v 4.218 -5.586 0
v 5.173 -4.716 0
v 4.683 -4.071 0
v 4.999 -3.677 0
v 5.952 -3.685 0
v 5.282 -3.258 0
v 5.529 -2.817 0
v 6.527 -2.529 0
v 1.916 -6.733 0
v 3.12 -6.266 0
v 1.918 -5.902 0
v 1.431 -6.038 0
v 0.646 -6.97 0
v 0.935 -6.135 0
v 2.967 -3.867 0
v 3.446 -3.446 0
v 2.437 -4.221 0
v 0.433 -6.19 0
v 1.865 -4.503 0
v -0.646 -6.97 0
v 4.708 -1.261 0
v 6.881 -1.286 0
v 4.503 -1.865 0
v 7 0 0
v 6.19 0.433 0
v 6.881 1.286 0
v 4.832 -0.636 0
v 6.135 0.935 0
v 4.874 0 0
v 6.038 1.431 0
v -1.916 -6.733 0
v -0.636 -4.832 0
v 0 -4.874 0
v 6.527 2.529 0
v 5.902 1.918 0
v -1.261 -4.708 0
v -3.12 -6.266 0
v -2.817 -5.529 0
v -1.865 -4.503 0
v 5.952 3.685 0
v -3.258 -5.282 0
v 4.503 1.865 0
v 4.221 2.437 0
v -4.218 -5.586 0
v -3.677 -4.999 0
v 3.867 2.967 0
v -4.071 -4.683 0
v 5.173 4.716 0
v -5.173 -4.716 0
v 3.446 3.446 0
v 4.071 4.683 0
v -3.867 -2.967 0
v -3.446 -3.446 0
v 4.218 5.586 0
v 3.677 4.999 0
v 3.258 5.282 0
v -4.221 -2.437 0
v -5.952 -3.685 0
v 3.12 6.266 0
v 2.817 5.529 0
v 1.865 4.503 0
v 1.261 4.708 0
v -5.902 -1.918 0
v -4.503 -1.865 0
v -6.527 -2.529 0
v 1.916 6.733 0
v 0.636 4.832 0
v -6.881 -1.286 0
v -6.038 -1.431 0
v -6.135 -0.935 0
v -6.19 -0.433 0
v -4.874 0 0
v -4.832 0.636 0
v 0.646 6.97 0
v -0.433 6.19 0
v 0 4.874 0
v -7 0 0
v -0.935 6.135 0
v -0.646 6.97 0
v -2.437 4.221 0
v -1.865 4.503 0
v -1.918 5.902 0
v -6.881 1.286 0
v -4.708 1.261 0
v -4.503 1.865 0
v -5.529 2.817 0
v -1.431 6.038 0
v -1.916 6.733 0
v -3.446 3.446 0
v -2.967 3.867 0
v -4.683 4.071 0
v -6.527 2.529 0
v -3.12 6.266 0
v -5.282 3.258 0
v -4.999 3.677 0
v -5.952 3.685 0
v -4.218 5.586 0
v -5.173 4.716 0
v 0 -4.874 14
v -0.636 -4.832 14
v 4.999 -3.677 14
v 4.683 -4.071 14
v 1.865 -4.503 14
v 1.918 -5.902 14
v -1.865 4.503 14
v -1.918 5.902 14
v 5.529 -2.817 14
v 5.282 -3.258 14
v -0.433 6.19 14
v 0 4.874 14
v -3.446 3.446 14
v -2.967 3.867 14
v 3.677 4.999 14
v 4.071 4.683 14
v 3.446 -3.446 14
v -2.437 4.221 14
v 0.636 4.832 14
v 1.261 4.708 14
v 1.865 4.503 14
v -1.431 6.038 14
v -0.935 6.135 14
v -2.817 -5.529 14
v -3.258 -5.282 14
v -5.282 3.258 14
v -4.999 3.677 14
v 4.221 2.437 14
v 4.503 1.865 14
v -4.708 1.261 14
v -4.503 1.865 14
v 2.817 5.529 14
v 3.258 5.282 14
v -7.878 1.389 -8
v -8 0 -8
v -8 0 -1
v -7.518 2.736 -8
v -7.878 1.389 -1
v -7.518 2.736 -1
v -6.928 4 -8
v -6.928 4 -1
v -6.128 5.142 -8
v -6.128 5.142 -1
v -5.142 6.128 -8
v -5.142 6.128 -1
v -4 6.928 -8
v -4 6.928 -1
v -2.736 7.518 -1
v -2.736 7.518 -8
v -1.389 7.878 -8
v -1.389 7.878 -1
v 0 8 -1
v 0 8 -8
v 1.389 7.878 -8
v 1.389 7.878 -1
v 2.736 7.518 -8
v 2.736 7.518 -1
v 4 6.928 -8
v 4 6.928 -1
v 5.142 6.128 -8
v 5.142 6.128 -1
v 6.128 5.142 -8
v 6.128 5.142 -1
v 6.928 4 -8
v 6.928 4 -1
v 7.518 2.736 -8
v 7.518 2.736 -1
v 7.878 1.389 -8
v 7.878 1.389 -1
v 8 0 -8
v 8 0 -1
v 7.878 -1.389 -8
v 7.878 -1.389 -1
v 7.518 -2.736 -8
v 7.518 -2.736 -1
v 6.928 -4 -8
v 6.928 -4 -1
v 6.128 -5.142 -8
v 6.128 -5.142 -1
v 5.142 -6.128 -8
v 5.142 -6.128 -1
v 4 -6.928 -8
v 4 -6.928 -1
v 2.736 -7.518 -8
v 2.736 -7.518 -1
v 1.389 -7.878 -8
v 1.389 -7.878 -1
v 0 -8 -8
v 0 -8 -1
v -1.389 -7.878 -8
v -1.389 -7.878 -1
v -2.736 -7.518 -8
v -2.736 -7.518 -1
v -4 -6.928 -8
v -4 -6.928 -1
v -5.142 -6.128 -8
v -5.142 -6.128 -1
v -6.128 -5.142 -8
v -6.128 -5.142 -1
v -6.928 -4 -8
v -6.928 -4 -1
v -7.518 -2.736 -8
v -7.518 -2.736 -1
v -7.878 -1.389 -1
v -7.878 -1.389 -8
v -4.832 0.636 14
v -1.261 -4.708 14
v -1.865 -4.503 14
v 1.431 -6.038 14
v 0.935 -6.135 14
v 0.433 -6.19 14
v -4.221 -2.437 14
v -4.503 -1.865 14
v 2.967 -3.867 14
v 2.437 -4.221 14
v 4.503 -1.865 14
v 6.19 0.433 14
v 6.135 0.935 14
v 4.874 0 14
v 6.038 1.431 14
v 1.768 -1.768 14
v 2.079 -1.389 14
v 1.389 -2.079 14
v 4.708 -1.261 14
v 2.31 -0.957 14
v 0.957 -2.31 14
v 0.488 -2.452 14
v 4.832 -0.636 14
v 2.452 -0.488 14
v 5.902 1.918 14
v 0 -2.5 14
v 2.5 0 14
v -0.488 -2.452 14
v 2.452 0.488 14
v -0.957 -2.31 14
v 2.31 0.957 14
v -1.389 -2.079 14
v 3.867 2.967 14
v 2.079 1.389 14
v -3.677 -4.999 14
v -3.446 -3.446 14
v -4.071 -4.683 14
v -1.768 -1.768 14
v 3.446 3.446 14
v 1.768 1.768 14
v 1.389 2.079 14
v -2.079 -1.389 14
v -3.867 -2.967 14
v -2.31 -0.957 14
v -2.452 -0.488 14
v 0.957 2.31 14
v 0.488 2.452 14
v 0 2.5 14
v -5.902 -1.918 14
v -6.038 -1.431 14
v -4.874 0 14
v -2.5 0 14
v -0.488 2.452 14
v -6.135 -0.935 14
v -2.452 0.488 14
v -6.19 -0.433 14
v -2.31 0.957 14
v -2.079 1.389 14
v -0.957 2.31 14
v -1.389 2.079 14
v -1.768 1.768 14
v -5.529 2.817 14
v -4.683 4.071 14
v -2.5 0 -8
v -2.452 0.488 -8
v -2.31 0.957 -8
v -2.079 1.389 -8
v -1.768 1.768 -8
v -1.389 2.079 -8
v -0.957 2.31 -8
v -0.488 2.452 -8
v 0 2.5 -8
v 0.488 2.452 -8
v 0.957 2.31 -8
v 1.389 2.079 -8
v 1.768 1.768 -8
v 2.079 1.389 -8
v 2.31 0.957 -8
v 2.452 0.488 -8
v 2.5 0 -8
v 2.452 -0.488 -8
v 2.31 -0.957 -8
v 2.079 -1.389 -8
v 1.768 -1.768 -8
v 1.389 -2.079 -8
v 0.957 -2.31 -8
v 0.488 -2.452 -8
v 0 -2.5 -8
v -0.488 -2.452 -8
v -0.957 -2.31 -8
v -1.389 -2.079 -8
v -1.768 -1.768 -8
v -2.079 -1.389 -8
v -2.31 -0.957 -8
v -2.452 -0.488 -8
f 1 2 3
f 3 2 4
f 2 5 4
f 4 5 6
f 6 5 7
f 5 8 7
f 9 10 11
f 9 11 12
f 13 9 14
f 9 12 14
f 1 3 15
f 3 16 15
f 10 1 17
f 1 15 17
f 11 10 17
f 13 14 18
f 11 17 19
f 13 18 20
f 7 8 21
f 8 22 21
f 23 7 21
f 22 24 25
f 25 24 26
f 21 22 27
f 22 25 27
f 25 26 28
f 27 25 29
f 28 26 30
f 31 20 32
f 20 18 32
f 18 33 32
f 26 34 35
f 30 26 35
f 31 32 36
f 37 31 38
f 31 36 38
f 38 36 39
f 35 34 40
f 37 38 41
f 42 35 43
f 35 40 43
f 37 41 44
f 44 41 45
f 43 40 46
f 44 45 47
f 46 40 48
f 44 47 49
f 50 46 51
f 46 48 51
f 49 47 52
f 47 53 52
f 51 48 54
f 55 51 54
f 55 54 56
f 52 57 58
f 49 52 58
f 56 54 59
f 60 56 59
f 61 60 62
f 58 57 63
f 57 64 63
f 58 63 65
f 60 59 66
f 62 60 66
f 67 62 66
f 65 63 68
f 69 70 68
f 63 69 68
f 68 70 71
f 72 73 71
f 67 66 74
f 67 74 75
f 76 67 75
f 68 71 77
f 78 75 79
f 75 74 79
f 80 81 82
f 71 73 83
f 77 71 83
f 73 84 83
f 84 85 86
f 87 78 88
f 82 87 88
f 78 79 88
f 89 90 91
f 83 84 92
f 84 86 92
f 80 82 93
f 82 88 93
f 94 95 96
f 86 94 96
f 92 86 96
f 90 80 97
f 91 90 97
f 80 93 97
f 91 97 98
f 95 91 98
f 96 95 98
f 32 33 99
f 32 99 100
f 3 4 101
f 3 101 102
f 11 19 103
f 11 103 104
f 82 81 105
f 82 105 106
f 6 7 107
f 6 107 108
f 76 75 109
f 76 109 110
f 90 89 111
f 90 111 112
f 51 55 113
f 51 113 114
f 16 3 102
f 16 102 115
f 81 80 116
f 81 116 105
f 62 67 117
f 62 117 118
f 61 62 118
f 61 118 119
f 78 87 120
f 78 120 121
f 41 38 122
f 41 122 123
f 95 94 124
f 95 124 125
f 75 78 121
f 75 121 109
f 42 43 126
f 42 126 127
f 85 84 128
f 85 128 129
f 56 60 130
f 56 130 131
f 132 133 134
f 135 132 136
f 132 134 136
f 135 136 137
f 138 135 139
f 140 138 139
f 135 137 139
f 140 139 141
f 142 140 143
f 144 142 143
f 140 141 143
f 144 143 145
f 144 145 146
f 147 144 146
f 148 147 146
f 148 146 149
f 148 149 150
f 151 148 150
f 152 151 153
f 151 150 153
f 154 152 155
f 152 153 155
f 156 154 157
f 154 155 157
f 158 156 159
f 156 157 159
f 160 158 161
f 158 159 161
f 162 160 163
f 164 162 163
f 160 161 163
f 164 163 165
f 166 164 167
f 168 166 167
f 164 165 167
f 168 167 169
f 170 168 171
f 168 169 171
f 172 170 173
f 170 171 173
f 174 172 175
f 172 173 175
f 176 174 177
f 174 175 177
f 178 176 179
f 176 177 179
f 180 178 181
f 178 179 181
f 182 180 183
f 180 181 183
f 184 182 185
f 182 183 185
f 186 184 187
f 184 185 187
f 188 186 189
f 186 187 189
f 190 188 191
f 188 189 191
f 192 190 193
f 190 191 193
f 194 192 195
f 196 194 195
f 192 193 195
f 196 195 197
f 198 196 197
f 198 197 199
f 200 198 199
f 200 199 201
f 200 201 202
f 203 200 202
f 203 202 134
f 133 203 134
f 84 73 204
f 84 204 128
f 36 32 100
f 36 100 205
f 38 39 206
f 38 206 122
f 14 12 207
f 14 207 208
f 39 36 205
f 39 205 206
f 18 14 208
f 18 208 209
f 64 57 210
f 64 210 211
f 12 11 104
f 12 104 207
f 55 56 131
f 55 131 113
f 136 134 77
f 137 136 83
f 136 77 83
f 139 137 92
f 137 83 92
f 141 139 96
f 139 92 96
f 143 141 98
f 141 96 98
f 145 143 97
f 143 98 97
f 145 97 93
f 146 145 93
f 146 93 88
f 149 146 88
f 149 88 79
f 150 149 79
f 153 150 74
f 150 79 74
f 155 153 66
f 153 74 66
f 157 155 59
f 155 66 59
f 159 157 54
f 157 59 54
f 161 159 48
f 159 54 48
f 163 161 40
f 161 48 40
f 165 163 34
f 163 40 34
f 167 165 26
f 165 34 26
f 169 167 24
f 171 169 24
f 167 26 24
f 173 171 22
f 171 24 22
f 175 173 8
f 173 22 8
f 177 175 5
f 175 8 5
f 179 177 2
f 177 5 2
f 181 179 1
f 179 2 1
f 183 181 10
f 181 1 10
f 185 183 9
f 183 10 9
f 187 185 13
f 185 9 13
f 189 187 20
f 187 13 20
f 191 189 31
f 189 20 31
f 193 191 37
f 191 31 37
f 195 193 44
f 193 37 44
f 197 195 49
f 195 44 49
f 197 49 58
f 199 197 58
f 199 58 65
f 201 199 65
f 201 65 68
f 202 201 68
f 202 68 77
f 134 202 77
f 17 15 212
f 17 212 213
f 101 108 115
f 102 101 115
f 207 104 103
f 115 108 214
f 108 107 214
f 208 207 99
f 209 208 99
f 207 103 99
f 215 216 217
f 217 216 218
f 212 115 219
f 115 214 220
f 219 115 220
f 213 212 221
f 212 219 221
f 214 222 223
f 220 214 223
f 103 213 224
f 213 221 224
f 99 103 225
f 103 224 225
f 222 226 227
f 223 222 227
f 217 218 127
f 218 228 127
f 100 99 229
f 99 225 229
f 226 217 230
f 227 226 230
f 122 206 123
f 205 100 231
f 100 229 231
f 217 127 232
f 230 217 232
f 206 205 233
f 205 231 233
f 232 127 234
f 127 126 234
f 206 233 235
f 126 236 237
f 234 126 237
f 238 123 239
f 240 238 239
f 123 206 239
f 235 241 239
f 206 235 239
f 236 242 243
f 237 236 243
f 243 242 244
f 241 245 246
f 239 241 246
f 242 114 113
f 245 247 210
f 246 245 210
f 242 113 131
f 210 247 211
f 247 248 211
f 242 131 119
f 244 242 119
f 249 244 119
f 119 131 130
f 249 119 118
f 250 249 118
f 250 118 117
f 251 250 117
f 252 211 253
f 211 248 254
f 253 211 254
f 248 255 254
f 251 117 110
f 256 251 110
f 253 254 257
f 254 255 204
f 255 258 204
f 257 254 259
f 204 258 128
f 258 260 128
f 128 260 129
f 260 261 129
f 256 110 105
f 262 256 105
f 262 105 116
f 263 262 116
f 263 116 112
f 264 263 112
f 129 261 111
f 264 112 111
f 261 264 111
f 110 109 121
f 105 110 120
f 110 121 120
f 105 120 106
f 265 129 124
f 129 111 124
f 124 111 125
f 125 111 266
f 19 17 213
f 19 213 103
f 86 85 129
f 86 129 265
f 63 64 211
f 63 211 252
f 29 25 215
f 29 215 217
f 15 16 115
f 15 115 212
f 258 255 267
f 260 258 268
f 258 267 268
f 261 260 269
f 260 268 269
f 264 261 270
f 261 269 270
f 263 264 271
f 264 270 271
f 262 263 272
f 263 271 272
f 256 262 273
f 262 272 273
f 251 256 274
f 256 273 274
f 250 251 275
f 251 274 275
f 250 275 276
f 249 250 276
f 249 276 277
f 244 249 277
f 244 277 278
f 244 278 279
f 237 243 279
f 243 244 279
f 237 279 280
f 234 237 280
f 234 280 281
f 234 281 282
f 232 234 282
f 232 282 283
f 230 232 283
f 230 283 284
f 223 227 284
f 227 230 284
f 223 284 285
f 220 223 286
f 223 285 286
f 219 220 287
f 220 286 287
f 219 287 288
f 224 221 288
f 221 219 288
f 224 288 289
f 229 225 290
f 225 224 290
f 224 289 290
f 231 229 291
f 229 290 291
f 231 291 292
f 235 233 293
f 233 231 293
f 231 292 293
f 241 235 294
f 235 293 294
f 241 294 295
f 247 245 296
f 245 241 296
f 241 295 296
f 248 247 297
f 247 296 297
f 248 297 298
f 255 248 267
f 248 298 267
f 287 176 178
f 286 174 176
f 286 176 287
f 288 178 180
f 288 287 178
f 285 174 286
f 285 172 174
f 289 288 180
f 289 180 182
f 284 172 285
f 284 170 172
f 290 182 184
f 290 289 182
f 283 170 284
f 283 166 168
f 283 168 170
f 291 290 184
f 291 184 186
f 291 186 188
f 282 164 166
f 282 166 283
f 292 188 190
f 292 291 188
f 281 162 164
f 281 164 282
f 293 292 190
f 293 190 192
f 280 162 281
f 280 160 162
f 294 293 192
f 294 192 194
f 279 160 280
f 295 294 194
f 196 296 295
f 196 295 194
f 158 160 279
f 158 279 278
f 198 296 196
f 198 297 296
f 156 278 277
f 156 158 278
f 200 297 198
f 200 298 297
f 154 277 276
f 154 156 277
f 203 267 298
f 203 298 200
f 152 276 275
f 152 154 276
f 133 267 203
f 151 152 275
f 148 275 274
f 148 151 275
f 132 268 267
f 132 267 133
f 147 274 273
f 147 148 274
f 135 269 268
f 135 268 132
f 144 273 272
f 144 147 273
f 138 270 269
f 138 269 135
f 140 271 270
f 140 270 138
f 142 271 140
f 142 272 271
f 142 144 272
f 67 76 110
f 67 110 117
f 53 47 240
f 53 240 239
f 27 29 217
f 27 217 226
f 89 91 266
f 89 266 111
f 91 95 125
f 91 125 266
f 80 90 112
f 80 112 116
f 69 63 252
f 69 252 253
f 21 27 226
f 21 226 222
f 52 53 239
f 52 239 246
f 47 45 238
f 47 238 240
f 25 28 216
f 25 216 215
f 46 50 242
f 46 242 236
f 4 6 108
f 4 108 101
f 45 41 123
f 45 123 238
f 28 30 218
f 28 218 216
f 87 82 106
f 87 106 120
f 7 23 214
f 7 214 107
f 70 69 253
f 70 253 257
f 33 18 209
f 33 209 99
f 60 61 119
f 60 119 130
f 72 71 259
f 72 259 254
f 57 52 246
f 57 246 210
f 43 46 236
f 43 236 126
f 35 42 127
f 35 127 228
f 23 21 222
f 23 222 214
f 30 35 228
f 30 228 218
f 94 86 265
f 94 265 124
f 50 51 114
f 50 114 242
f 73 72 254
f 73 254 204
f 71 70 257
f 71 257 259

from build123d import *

# Parameters (mm, degrees)
SKETCH2_R           = 2.5
BOSS_EXTRUDE1_DEPTH = 14
SKETCH3_R           = 8
BOSS_EXTRUDE2_DEPTH = 8
SKETCH4_R           = 2.5
CUT_EXTRUDE1_DEPTH  = 23
CHAMFER1_SIZE       = 1


with BuildPart() as part:
    # Sketch2 → Boss-Extrude1 (new body)
    with BuildSketch(Plane.XY):
        Polygon((4.873707771, 0), (4.832012177, -0.636146486), (4.707640171, -1.261407971), (4.502718925, -1.865087032), (5.52904892, -2.817190886), (5.281517029, -3.257688046), (4.998967171, -3.676585913), (4.683272839, -4.071106911), (3.44623208, -3.44623208), (2.966924906, -3.866571903), (2.436853886, -4.2207551), (1.865087032, -4.502718925), (1.917572975, -5.901682854), (1.431063056, -6.038129807), (0.935064673, -6.134541988), (0.432866603, -6.190280914), (0, -4.873707771), (-0.636146486, -4.832012177), (-1.261407971, -4.707640171), (-1.865087032, -4.502718925), (-2.817190886, -5.52904892), (-3.257688046, -5.281517029), (-3.676585913, -4.998967171), (-4.071106911, -4.683272839), (-3.44623208, -3.44623208), (-3.866571903, -2.966924906), (-4.2207551, -2.436853886), (-4.502718925, -1.865087032), (-5.901682854, -1.917572975), (-6.038129807, -1.431063056), (-6.134541988, -0.935064673), (-6.190280914, -0.432866603), (-4.873707771, 0), (-4.832012177, 0.636146486), (-4.707640171, 1.261407971), (-4.502718925, 1.865087032), (-5.52904892, 2.817190886), (-5.281517029, 3.257688046), (-4.998967171, 3.676585913), (-4.683272839, 4.071106911), (-3.44623208, 3.44623208), (-2.966924906, 3.866571903), (-2.436853886, 4.2207551), (-1.865087032, 4.502718925), (-1.917572975, 5.901682854), (-1.431063056, 6.038129807), (-0.935064673, 6.134541988), (-0.432866603, 6.190280914), (0, 4.873707771), (0.636146486, 4.832012177), (1.261407971, 4.707640171), (1.865087032, 4.502718925), (2.817190886, 5.52904892), (3.257688046, 5.281517029), (3.676585913, 4.998967171), (4.071106911, 4.683272839), (3.44623208, 3.44623208), (3.866571903, 2.966924906), (4.2207551, 2.436853886), (4.502718925, 1.865087032), (5.901682854, 1.917572975), (6.038129807, 1.431063056), (6.134541988, 0.935064673), (6.190280914, 0.432866603), align=None)
        Circle(SKETCH2_R, mode=Mode.SUBTRACT)
    extrude(amount=BOSS_EXTRUDE1_DEPTH)

    # Sketch3 → Boss-Extrude2 (add)
    with BuildSketch(Plane(origin=(0, 0, 0), x_dir=(-1, 0, 0), z_dir=(0, 0, -1))):
        Circle(SKETCH3_R)
    extrude(amount=BOSS_EXTRUDE2_DEPTH)

    # Sketch4 → Cut-Extrude1 (cut, through all)
    with BuildSketch(Plane(origin=(0, 0, -8), x_dir=(-1, 0, 0), z_dir=(0, 0, -1))):
        Circle(SKETCH4_R)
    extrude(amount=-CUT_EXTRUDE1_DEPTH, mode=Mode.SUBTRACT)

    # Chamfer1
    chamfer1_edges = [part.edges().sort_by_distance(p)[0] for p in [
        (8, 0, 0),
    ]]
    chamfer(chamfer1_edges, length=CHAMFER1_SIZE)


solid = part.part
